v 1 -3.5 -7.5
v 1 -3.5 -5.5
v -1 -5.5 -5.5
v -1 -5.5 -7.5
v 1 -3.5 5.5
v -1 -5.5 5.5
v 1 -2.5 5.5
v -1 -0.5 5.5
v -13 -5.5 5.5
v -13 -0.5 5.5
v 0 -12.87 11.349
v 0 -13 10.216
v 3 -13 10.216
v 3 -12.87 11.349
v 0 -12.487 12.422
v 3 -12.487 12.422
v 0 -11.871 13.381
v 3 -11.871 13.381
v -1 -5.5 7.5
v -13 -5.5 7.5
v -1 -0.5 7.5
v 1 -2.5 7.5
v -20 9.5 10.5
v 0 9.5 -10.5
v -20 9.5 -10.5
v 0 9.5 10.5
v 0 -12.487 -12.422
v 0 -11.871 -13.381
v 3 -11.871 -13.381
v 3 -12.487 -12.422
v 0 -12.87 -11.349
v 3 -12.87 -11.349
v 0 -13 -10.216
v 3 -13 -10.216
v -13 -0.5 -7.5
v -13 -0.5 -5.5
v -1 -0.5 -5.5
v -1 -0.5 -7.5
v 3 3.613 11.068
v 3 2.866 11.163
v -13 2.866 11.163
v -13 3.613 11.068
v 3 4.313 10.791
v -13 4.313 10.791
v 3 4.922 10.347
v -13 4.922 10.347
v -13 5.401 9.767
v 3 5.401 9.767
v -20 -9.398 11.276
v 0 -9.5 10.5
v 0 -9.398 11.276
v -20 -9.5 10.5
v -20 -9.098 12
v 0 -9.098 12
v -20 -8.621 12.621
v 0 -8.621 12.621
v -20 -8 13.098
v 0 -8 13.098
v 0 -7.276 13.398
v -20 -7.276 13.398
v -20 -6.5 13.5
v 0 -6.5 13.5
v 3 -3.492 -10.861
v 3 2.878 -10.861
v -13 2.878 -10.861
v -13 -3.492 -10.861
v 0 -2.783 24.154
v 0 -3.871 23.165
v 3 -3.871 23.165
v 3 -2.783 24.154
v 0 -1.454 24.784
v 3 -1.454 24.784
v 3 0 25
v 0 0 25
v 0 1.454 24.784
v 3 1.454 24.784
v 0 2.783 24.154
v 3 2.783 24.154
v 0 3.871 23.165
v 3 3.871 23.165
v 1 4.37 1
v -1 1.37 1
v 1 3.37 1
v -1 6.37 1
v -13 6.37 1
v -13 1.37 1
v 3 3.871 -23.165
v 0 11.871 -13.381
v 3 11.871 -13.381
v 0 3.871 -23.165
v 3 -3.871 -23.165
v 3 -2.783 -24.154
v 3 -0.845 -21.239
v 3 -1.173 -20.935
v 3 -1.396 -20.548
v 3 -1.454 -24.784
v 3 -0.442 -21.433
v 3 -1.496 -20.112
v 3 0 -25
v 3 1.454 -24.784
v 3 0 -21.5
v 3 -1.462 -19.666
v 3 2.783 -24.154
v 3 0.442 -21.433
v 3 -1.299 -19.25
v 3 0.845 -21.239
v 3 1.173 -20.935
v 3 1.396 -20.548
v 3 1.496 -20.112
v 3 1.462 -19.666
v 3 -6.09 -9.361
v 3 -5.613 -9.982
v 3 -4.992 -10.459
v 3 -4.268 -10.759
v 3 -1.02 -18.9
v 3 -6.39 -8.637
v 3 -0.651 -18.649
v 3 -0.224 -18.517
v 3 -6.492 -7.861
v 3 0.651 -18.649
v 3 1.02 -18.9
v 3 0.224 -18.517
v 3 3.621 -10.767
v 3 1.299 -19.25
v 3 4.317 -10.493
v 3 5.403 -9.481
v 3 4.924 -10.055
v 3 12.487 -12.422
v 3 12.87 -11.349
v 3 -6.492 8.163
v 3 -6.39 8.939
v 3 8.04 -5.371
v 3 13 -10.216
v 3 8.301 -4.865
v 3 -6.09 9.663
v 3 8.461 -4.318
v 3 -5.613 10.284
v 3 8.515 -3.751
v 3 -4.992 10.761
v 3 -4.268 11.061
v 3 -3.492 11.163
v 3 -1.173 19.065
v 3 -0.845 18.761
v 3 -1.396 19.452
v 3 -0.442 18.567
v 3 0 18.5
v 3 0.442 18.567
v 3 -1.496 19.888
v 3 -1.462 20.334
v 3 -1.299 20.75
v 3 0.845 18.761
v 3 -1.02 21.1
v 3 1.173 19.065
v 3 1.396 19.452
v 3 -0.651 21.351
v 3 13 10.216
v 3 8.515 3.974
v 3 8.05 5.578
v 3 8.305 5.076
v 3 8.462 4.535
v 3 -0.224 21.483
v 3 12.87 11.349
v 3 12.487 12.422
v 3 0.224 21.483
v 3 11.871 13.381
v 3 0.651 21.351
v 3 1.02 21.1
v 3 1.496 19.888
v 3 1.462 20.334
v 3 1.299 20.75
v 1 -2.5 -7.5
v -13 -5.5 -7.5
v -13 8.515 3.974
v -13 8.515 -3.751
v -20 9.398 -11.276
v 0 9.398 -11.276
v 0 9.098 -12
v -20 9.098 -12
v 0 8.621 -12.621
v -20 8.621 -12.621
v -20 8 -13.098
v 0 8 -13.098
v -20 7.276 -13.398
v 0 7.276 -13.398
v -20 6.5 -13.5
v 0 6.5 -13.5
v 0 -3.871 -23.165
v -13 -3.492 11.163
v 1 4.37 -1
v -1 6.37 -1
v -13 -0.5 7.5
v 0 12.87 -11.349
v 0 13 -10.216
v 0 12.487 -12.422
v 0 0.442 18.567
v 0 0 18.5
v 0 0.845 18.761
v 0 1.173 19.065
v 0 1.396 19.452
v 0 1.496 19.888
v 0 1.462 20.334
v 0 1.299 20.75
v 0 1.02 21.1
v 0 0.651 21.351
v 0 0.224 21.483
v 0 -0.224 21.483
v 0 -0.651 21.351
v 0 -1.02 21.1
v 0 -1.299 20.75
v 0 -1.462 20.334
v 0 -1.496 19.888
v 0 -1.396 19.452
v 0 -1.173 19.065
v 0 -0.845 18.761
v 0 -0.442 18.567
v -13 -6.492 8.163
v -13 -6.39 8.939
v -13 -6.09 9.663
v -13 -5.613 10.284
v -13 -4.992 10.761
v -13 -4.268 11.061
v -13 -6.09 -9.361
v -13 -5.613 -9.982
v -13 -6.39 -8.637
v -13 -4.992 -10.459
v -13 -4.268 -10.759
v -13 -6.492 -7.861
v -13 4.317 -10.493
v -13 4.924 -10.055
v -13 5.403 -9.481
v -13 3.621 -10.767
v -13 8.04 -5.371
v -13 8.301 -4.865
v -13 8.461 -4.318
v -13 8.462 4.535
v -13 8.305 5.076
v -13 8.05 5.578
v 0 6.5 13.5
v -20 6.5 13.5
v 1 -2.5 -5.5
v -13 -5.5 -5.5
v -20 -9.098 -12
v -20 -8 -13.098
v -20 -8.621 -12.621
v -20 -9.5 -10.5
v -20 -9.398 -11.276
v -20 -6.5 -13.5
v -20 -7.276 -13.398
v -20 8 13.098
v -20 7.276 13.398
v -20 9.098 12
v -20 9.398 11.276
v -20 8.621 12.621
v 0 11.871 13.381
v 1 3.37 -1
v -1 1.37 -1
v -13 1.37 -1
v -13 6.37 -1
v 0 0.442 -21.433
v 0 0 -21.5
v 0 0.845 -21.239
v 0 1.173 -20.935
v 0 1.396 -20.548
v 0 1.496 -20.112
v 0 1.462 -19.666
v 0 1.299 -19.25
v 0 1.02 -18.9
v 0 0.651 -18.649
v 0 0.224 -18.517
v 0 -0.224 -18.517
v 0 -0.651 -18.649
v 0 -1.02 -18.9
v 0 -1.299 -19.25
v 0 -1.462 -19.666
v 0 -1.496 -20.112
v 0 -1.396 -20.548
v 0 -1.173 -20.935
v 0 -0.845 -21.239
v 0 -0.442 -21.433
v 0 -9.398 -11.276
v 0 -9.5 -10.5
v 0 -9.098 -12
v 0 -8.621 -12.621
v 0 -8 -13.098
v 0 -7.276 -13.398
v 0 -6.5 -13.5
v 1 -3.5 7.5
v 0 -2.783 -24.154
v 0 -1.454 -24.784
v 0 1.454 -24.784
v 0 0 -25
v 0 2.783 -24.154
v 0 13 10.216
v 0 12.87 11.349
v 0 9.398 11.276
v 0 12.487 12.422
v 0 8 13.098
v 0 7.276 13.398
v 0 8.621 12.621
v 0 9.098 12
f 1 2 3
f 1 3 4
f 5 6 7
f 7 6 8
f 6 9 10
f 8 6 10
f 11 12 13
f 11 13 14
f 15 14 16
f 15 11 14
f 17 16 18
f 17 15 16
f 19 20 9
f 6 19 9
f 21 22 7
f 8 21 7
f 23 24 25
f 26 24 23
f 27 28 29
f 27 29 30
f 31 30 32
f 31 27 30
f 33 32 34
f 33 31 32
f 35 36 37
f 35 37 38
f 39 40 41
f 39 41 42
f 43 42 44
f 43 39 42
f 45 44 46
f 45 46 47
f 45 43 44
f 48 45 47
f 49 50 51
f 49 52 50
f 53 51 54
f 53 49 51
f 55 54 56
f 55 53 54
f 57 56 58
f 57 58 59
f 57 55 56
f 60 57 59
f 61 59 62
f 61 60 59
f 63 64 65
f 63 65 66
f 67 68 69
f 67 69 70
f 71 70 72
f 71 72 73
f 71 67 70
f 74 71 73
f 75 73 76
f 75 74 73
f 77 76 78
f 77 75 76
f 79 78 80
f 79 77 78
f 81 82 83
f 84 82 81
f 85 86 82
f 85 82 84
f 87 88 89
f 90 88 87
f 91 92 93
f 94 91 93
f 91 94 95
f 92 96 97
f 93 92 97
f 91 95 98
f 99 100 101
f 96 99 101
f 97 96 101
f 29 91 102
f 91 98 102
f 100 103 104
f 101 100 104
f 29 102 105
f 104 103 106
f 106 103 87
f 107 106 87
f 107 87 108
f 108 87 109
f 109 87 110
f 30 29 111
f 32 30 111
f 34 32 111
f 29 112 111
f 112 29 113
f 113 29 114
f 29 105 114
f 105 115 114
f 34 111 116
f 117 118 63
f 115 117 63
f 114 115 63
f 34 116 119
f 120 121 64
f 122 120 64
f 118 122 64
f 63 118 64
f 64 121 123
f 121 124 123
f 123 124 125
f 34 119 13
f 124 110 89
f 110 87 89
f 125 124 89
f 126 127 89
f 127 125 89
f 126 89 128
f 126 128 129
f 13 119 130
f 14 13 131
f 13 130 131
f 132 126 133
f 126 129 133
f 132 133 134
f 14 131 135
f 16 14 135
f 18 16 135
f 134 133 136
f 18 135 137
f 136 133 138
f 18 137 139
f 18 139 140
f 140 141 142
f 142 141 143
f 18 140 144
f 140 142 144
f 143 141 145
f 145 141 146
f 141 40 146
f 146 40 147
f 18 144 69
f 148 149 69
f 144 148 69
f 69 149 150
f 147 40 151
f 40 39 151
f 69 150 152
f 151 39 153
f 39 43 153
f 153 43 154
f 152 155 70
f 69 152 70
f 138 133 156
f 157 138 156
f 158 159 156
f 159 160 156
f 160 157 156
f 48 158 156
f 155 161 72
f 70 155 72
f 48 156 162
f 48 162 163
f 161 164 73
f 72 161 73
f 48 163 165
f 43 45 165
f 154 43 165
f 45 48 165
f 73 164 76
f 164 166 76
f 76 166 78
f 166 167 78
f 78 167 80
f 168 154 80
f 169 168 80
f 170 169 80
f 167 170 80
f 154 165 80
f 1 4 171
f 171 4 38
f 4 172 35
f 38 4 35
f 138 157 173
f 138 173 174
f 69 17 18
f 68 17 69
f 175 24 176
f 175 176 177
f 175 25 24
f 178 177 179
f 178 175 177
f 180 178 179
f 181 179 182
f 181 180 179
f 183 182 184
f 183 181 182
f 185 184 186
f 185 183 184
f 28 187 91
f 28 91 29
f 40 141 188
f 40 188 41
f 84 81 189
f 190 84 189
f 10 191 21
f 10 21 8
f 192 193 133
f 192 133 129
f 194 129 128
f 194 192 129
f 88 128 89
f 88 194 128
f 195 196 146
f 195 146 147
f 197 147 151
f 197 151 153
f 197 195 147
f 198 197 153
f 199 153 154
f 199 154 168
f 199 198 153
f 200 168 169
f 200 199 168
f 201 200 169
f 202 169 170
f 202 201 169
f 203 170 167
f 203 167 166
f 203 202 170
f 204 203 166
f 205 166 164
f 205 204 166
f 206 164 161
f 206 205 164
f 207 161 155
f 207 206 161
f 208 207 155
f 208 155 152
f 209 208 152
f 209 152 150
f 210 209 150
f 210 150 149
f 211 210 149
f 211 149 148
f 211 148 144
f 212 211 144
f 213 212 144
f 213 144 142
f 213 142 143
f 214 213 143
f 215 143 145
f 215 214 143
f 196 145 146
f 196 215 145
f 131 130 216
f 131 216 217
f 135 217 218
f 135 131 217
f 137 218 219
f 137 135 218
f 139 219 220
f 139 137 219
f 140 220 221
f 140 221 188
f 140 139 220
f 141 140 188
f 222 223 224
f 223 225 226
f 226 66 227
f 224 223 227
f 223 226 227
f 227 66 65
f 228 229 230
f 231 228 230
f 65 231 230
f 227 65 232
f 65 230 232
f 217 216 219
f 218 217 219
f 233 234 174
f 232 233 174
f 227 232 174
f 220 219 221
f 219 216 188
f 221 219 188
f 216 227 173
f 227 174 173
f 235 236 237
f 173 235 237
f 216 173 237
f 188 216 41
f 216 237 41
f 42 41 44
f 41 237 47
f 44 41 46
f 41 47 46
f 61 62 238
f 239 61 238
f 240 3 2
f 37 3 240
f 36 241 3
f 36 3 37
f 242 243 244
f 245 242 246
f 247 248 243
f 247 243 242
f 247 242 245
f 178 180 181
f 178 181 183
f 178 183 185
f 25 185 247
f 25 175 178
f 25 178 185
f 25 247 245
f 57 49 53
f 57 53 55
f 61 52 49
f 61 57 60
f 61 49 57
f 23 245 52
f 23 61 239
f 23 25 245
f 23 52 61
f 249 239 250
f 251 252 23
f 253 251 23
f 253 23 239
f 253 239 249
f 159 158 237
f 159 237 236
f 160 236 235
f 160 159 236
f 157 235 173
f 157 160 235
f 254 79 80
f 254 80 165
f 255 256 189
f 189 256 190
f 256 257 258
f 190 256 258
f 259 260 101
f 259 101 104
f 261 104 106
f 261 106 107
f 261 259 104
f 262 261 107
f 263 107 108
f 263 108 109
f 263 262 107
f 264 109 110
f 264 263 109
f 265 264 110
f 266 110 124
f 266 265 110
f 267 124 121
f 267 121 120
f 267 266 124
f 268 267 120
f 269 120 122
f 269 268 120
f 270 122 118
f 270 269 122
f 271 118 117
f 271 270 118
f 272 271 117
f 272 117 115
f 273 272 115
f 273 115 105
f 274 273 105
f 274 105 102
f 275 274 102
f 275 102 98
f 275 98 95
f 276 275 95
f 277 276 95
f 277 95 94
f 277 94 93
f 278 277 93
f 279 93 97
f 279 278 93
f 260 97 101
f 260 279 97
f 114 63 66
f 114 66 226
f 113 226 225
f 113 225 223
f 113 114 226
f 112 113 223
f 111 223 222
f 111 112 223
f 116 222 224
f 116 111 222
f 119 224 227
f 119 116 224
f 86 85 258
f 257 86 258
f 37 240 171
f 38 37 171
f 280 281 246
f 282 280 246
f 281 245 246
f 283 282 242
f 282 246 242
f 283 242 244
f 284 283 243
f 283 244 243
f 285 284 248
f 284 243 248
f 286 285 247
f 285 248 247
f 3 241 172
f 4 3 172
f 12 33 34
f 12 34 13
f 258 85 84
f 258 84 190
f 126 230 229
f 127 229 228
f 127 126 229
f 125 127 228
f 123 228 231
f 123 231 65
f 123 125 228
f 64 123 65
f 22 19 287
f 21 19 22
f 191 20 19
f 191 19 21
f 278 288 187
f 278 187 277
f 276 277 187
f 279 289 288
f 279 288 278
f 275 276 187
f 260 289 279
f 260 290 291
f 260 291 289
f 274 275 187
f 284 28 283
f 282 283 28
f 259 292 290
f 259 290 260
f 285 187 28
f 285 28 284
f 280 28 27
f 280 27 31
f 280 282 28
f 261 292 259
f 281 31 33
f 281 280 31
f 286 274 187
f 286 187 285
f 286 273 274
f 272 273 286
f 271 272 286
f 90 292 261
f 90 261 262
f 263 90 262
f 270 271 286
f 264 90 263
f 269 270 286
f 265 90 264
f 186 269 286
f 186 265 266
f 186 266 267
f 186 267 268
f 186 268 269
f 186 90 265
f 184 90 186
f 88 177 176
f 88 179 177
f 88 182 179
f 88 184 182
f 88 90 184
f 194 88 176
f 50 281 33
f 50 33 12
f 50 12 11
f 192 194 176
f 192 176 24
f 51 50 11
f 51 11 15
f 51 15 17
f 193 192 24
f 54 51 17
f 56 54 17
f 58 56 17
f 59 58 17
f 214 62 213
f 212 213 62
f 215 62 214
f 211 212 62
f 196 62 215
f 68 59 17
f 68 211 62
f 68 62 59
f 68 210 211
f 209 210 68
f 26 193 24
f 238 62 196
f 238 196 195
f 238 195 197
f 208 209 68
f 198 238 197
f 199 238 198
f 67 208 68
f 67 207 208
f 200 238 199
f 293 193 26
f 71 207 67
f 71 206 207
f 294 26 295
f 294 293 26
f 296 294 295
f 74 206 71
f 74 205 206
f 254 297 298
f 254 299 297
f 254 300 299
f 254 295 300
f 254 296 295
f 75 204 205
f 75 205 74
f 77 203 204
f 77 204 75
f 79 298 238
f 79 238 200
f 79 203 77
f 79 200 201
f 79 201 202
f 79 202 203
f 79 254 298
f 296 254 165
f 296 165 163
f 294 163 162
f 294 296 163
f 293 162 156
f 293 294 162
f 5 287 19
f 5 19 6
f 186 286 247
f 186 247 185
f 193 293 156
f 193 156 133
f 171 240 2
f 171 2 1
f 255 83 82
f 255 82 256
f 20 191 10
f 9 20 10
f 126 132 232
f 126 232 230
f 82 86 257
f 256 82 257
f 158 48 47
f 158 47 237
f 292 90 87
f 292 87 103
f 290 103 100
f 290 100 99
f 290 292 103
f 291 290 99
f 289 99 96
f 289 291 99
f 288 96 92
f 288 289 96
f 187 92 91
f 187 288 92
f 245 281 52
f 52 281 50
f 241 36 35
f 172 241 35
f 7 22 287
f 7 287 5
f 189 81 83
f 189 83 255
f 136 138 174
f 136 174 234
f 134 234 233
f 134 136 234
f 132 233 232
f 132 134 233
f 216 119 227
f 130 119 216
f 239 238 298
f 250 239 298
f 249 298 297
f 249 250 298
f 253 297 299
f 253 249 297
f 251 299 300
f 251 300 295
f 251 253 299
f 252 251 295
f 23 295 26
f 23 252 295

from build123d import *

# Parameters (mm, degrees)
SKETCH1_R             = 1.5
BOSS_EXTRUDE1_DEPTH   = 3
SKETCH2_W             = 27
SKETCH2_H             = 19
BOSS_EXTRUDE2_DEPTH   = 20
FILLET1_R             = 3
CUT_EXTRUDE1_DEPTH    = 16
SKETCH4_W             = 2
SKETCH4_H             = 5
BOSS_EXTRUDE3_DEPTH   = 14
BOSS_EXTRUDE3_2_DEPTH = 14
BOSS_EXTRUDE3_3_DEPTH = 14
CHAMFER1_SIZE         = 2
CHAMFER2_SIZE         = 2
CHAMFER3_SIZE         = 2


with BuildPart() as part:
    # Sketch1 → Boss-Extrude1 (new body)
    with BuildSketch(Plane(origin=(0, 0, 0), x_dir=(0, 0, -1), z_dir=(1, 0, 0))):
        with BuildLine():
            Line((-23.16499284, 3.870764824), (-13.381046978, 11.870764824))
            ThreePointArc((-13.381046978, 11.870764824), (-11.89625887, 12.709236887), (-10.216054138, 13))
            Line((-10.216054138, 13), (10.216054138, 13))
            ThreePointArc((10.216054138, 13), (11.89625887, 12.709236887), (13.381046978, 11.870764824))
            Line((13.381046978, 11.870764824), (23.16499284, 3.870764824))
            ThreePointArc((23.16499284, 3.870764824), (25, 0), (23.16499284, -3.870764824))
            Line((23.16499284, -3.870764824), (13.381046978, -11.870764824))
            ThreePointArc((13.381046978, -11.870764824), (11.89625887, -12.709236887), (10.216054138, -13))
            Line((10.216054138, -13), (-10.216054138, -13))
            ThreePointArc((-10.216054138, -13), (-11.89625887, -12.709236887), (-13.381046978, -11.870764824))
            Line((-13.381046978, -11.870764824), (-23.16499284, -3.870764824))
            ThreePointArc((-23.16499284, -3.870764824), (-25, 0), (-23.16499284, 3.870764824))
        make_face()
        with Locations((-20, 0)):
            Circle(SKETCH1_R, mode=Mode.SUBTRACT)
        with Locations((20, 0)):
            Circle(SKETCH1_R, mode=Mode.SUBTRACT)
    extrude(amount=BOSS_EXTRUDE1_DEPTH)

    # Sketch2 → Boss-Extrude2 (add)
    with BuildSketch(Plane.ZY):
        Rectangle(SKETCH2_W, SKETCH2_H)
    extrude(amount=BOSS_EXTRUDE2_DEPTH)

    # Fillet1
    fillet1_edges = [part.edges().sort_by_distance(p)[0] for p in [
        (-10, 9.5, -13.5),
        (-10, -9.5, -13.5),
        (-10, -9.5, 13.5),
        (-10, 9.5, 13.5),
    ]]
    fillet(fillet1_edges, radius=FILLET1_R)

    # Sketch3 → Cut-Extrude1 (cut)
    with BuildSketch(Plane(origin=(3, 0, 0), x_dir=(0, 0, -1), z_dir=(1, 0, 0))):
        with BuildLine():
            Line((-3.974251102, 8.514836849), (3.75121773, 8.514836849))
            ThreePointArc((3.75121773, 8.514836849), (4.595308875, 8.393640444), (5.371199479, 8.039843608))
            Line((5.371199479, 8.039843608), (9.48076945, 5.403245378))
            ThreePointArc((9.48076945, 5.403245378), (10.493271817, 4.31699759), (10.8607877, 2.878238619))
            Line((10.8607877, 2.878238619), (10.8607877, -3.491879979))
            ThreePointArc((10.8607877, -3.491879979), (9.982108044, -5.613200323), (7.8607877, -6.491879979))
            Line((7.8607877, -6.491879979), (-8.162890641, -6.491879979))
            ThreePointArc((-8.162890641, -6.491879979), (-10.284210984, -5.613200323), (-11.162890641, -3.491879979))
            Line((-11.162890641, -3.491879979), (-11.162890641, 2.865611104))
            ThreePointArc((-11.162890641, 2.865611104), (-10.790706161, 4.312879425), (-9.766500246, 5.401047207))
            Line((-9.766500246, 5.401047207), (-5.577860708, 8.050272952))
            ThreePointArc((-5.577860708, 8.050272952), (-4.809024032, 8.396356267), (-3.974251102, 8.514836849))
        make_face()
    extrude(amount=-CUT_EXTRUDE1_DEPTH, mode=Mode.SUBTRACT)


with BuildPart() as body_2:
    # Sketch4 → Boss-Extrude3 (new body)
    with BuildSketch(Plane(origin=(-13, 0, 0), x_dir=(0, 0, -1), z_dir=(1, 0, 0))):
        with Locations((0, 3.869772999)):
            Rectangle(SKETCH4_W, SKETCH4_H)
    extrude(amount=BOSS_EXTRUDE3_DEPTH)

    # Chamfer1
    chamfer1_edges = [body_2.edges().sort_by_distance(p)[0] for p in [
        (1, 6.369772999, 0),
        (1, 1.369772999, 0),
    ]]
    chamfer(chamfer1_edges, length=CHAMFER1_SIZE)


with BuildPart() as body_3:
    # Sketch4 → Boss-Extrude3 2 (new body)
    with BuildSketch(Plane(origin=(-13, 0, 0), x_dir=(0, 0, -1), z_dir=(1, 0, 0))):
        with Locations((-6.5, -3)):
            Rectangle(SKETCH4_W, SKETCH4_H)
    extrude(amount=BOSS_EXTRUDE3_2_DEPTH)

    # Chamfer2
    chamfer2_edges = [body_3.edges().sort_by_distance(p)[0] for p in [
        (1, -0.5, 6.5),
        (1, -5.5, 6.5),
    ]]
    chamfer(chamfer2_edges, length=CHAMFER2_SIZE)


with BuildPart() as body_4:
    # Sketch4 → Boss-Extrude3 3 (new body)
    with BuildSketch(Plane(origin=(-13, 0, 0), x_dir=(0, 0, -1), z_dir=(1, 0, 0))):
        with Locations((6.5, -3)):
            Rectangle(SKETCH4_W, SKETCH4_H)
    extrude(amount=BOSS_EXTRUDE3_3_DEPTH)

    # Chamfer3
    chamfer3_edges = [body_4.edges().sort_by_distance(p)[0] for p in [
        (1, -0.5, -6.5),
        (1, -5.5, -6.5),
    ]]
    chamfer(chamfer3_edges, length=CHAMFER3_SIZE)


solid = Compound([part.part, body_2.part, body_3.part, body_4.part])
